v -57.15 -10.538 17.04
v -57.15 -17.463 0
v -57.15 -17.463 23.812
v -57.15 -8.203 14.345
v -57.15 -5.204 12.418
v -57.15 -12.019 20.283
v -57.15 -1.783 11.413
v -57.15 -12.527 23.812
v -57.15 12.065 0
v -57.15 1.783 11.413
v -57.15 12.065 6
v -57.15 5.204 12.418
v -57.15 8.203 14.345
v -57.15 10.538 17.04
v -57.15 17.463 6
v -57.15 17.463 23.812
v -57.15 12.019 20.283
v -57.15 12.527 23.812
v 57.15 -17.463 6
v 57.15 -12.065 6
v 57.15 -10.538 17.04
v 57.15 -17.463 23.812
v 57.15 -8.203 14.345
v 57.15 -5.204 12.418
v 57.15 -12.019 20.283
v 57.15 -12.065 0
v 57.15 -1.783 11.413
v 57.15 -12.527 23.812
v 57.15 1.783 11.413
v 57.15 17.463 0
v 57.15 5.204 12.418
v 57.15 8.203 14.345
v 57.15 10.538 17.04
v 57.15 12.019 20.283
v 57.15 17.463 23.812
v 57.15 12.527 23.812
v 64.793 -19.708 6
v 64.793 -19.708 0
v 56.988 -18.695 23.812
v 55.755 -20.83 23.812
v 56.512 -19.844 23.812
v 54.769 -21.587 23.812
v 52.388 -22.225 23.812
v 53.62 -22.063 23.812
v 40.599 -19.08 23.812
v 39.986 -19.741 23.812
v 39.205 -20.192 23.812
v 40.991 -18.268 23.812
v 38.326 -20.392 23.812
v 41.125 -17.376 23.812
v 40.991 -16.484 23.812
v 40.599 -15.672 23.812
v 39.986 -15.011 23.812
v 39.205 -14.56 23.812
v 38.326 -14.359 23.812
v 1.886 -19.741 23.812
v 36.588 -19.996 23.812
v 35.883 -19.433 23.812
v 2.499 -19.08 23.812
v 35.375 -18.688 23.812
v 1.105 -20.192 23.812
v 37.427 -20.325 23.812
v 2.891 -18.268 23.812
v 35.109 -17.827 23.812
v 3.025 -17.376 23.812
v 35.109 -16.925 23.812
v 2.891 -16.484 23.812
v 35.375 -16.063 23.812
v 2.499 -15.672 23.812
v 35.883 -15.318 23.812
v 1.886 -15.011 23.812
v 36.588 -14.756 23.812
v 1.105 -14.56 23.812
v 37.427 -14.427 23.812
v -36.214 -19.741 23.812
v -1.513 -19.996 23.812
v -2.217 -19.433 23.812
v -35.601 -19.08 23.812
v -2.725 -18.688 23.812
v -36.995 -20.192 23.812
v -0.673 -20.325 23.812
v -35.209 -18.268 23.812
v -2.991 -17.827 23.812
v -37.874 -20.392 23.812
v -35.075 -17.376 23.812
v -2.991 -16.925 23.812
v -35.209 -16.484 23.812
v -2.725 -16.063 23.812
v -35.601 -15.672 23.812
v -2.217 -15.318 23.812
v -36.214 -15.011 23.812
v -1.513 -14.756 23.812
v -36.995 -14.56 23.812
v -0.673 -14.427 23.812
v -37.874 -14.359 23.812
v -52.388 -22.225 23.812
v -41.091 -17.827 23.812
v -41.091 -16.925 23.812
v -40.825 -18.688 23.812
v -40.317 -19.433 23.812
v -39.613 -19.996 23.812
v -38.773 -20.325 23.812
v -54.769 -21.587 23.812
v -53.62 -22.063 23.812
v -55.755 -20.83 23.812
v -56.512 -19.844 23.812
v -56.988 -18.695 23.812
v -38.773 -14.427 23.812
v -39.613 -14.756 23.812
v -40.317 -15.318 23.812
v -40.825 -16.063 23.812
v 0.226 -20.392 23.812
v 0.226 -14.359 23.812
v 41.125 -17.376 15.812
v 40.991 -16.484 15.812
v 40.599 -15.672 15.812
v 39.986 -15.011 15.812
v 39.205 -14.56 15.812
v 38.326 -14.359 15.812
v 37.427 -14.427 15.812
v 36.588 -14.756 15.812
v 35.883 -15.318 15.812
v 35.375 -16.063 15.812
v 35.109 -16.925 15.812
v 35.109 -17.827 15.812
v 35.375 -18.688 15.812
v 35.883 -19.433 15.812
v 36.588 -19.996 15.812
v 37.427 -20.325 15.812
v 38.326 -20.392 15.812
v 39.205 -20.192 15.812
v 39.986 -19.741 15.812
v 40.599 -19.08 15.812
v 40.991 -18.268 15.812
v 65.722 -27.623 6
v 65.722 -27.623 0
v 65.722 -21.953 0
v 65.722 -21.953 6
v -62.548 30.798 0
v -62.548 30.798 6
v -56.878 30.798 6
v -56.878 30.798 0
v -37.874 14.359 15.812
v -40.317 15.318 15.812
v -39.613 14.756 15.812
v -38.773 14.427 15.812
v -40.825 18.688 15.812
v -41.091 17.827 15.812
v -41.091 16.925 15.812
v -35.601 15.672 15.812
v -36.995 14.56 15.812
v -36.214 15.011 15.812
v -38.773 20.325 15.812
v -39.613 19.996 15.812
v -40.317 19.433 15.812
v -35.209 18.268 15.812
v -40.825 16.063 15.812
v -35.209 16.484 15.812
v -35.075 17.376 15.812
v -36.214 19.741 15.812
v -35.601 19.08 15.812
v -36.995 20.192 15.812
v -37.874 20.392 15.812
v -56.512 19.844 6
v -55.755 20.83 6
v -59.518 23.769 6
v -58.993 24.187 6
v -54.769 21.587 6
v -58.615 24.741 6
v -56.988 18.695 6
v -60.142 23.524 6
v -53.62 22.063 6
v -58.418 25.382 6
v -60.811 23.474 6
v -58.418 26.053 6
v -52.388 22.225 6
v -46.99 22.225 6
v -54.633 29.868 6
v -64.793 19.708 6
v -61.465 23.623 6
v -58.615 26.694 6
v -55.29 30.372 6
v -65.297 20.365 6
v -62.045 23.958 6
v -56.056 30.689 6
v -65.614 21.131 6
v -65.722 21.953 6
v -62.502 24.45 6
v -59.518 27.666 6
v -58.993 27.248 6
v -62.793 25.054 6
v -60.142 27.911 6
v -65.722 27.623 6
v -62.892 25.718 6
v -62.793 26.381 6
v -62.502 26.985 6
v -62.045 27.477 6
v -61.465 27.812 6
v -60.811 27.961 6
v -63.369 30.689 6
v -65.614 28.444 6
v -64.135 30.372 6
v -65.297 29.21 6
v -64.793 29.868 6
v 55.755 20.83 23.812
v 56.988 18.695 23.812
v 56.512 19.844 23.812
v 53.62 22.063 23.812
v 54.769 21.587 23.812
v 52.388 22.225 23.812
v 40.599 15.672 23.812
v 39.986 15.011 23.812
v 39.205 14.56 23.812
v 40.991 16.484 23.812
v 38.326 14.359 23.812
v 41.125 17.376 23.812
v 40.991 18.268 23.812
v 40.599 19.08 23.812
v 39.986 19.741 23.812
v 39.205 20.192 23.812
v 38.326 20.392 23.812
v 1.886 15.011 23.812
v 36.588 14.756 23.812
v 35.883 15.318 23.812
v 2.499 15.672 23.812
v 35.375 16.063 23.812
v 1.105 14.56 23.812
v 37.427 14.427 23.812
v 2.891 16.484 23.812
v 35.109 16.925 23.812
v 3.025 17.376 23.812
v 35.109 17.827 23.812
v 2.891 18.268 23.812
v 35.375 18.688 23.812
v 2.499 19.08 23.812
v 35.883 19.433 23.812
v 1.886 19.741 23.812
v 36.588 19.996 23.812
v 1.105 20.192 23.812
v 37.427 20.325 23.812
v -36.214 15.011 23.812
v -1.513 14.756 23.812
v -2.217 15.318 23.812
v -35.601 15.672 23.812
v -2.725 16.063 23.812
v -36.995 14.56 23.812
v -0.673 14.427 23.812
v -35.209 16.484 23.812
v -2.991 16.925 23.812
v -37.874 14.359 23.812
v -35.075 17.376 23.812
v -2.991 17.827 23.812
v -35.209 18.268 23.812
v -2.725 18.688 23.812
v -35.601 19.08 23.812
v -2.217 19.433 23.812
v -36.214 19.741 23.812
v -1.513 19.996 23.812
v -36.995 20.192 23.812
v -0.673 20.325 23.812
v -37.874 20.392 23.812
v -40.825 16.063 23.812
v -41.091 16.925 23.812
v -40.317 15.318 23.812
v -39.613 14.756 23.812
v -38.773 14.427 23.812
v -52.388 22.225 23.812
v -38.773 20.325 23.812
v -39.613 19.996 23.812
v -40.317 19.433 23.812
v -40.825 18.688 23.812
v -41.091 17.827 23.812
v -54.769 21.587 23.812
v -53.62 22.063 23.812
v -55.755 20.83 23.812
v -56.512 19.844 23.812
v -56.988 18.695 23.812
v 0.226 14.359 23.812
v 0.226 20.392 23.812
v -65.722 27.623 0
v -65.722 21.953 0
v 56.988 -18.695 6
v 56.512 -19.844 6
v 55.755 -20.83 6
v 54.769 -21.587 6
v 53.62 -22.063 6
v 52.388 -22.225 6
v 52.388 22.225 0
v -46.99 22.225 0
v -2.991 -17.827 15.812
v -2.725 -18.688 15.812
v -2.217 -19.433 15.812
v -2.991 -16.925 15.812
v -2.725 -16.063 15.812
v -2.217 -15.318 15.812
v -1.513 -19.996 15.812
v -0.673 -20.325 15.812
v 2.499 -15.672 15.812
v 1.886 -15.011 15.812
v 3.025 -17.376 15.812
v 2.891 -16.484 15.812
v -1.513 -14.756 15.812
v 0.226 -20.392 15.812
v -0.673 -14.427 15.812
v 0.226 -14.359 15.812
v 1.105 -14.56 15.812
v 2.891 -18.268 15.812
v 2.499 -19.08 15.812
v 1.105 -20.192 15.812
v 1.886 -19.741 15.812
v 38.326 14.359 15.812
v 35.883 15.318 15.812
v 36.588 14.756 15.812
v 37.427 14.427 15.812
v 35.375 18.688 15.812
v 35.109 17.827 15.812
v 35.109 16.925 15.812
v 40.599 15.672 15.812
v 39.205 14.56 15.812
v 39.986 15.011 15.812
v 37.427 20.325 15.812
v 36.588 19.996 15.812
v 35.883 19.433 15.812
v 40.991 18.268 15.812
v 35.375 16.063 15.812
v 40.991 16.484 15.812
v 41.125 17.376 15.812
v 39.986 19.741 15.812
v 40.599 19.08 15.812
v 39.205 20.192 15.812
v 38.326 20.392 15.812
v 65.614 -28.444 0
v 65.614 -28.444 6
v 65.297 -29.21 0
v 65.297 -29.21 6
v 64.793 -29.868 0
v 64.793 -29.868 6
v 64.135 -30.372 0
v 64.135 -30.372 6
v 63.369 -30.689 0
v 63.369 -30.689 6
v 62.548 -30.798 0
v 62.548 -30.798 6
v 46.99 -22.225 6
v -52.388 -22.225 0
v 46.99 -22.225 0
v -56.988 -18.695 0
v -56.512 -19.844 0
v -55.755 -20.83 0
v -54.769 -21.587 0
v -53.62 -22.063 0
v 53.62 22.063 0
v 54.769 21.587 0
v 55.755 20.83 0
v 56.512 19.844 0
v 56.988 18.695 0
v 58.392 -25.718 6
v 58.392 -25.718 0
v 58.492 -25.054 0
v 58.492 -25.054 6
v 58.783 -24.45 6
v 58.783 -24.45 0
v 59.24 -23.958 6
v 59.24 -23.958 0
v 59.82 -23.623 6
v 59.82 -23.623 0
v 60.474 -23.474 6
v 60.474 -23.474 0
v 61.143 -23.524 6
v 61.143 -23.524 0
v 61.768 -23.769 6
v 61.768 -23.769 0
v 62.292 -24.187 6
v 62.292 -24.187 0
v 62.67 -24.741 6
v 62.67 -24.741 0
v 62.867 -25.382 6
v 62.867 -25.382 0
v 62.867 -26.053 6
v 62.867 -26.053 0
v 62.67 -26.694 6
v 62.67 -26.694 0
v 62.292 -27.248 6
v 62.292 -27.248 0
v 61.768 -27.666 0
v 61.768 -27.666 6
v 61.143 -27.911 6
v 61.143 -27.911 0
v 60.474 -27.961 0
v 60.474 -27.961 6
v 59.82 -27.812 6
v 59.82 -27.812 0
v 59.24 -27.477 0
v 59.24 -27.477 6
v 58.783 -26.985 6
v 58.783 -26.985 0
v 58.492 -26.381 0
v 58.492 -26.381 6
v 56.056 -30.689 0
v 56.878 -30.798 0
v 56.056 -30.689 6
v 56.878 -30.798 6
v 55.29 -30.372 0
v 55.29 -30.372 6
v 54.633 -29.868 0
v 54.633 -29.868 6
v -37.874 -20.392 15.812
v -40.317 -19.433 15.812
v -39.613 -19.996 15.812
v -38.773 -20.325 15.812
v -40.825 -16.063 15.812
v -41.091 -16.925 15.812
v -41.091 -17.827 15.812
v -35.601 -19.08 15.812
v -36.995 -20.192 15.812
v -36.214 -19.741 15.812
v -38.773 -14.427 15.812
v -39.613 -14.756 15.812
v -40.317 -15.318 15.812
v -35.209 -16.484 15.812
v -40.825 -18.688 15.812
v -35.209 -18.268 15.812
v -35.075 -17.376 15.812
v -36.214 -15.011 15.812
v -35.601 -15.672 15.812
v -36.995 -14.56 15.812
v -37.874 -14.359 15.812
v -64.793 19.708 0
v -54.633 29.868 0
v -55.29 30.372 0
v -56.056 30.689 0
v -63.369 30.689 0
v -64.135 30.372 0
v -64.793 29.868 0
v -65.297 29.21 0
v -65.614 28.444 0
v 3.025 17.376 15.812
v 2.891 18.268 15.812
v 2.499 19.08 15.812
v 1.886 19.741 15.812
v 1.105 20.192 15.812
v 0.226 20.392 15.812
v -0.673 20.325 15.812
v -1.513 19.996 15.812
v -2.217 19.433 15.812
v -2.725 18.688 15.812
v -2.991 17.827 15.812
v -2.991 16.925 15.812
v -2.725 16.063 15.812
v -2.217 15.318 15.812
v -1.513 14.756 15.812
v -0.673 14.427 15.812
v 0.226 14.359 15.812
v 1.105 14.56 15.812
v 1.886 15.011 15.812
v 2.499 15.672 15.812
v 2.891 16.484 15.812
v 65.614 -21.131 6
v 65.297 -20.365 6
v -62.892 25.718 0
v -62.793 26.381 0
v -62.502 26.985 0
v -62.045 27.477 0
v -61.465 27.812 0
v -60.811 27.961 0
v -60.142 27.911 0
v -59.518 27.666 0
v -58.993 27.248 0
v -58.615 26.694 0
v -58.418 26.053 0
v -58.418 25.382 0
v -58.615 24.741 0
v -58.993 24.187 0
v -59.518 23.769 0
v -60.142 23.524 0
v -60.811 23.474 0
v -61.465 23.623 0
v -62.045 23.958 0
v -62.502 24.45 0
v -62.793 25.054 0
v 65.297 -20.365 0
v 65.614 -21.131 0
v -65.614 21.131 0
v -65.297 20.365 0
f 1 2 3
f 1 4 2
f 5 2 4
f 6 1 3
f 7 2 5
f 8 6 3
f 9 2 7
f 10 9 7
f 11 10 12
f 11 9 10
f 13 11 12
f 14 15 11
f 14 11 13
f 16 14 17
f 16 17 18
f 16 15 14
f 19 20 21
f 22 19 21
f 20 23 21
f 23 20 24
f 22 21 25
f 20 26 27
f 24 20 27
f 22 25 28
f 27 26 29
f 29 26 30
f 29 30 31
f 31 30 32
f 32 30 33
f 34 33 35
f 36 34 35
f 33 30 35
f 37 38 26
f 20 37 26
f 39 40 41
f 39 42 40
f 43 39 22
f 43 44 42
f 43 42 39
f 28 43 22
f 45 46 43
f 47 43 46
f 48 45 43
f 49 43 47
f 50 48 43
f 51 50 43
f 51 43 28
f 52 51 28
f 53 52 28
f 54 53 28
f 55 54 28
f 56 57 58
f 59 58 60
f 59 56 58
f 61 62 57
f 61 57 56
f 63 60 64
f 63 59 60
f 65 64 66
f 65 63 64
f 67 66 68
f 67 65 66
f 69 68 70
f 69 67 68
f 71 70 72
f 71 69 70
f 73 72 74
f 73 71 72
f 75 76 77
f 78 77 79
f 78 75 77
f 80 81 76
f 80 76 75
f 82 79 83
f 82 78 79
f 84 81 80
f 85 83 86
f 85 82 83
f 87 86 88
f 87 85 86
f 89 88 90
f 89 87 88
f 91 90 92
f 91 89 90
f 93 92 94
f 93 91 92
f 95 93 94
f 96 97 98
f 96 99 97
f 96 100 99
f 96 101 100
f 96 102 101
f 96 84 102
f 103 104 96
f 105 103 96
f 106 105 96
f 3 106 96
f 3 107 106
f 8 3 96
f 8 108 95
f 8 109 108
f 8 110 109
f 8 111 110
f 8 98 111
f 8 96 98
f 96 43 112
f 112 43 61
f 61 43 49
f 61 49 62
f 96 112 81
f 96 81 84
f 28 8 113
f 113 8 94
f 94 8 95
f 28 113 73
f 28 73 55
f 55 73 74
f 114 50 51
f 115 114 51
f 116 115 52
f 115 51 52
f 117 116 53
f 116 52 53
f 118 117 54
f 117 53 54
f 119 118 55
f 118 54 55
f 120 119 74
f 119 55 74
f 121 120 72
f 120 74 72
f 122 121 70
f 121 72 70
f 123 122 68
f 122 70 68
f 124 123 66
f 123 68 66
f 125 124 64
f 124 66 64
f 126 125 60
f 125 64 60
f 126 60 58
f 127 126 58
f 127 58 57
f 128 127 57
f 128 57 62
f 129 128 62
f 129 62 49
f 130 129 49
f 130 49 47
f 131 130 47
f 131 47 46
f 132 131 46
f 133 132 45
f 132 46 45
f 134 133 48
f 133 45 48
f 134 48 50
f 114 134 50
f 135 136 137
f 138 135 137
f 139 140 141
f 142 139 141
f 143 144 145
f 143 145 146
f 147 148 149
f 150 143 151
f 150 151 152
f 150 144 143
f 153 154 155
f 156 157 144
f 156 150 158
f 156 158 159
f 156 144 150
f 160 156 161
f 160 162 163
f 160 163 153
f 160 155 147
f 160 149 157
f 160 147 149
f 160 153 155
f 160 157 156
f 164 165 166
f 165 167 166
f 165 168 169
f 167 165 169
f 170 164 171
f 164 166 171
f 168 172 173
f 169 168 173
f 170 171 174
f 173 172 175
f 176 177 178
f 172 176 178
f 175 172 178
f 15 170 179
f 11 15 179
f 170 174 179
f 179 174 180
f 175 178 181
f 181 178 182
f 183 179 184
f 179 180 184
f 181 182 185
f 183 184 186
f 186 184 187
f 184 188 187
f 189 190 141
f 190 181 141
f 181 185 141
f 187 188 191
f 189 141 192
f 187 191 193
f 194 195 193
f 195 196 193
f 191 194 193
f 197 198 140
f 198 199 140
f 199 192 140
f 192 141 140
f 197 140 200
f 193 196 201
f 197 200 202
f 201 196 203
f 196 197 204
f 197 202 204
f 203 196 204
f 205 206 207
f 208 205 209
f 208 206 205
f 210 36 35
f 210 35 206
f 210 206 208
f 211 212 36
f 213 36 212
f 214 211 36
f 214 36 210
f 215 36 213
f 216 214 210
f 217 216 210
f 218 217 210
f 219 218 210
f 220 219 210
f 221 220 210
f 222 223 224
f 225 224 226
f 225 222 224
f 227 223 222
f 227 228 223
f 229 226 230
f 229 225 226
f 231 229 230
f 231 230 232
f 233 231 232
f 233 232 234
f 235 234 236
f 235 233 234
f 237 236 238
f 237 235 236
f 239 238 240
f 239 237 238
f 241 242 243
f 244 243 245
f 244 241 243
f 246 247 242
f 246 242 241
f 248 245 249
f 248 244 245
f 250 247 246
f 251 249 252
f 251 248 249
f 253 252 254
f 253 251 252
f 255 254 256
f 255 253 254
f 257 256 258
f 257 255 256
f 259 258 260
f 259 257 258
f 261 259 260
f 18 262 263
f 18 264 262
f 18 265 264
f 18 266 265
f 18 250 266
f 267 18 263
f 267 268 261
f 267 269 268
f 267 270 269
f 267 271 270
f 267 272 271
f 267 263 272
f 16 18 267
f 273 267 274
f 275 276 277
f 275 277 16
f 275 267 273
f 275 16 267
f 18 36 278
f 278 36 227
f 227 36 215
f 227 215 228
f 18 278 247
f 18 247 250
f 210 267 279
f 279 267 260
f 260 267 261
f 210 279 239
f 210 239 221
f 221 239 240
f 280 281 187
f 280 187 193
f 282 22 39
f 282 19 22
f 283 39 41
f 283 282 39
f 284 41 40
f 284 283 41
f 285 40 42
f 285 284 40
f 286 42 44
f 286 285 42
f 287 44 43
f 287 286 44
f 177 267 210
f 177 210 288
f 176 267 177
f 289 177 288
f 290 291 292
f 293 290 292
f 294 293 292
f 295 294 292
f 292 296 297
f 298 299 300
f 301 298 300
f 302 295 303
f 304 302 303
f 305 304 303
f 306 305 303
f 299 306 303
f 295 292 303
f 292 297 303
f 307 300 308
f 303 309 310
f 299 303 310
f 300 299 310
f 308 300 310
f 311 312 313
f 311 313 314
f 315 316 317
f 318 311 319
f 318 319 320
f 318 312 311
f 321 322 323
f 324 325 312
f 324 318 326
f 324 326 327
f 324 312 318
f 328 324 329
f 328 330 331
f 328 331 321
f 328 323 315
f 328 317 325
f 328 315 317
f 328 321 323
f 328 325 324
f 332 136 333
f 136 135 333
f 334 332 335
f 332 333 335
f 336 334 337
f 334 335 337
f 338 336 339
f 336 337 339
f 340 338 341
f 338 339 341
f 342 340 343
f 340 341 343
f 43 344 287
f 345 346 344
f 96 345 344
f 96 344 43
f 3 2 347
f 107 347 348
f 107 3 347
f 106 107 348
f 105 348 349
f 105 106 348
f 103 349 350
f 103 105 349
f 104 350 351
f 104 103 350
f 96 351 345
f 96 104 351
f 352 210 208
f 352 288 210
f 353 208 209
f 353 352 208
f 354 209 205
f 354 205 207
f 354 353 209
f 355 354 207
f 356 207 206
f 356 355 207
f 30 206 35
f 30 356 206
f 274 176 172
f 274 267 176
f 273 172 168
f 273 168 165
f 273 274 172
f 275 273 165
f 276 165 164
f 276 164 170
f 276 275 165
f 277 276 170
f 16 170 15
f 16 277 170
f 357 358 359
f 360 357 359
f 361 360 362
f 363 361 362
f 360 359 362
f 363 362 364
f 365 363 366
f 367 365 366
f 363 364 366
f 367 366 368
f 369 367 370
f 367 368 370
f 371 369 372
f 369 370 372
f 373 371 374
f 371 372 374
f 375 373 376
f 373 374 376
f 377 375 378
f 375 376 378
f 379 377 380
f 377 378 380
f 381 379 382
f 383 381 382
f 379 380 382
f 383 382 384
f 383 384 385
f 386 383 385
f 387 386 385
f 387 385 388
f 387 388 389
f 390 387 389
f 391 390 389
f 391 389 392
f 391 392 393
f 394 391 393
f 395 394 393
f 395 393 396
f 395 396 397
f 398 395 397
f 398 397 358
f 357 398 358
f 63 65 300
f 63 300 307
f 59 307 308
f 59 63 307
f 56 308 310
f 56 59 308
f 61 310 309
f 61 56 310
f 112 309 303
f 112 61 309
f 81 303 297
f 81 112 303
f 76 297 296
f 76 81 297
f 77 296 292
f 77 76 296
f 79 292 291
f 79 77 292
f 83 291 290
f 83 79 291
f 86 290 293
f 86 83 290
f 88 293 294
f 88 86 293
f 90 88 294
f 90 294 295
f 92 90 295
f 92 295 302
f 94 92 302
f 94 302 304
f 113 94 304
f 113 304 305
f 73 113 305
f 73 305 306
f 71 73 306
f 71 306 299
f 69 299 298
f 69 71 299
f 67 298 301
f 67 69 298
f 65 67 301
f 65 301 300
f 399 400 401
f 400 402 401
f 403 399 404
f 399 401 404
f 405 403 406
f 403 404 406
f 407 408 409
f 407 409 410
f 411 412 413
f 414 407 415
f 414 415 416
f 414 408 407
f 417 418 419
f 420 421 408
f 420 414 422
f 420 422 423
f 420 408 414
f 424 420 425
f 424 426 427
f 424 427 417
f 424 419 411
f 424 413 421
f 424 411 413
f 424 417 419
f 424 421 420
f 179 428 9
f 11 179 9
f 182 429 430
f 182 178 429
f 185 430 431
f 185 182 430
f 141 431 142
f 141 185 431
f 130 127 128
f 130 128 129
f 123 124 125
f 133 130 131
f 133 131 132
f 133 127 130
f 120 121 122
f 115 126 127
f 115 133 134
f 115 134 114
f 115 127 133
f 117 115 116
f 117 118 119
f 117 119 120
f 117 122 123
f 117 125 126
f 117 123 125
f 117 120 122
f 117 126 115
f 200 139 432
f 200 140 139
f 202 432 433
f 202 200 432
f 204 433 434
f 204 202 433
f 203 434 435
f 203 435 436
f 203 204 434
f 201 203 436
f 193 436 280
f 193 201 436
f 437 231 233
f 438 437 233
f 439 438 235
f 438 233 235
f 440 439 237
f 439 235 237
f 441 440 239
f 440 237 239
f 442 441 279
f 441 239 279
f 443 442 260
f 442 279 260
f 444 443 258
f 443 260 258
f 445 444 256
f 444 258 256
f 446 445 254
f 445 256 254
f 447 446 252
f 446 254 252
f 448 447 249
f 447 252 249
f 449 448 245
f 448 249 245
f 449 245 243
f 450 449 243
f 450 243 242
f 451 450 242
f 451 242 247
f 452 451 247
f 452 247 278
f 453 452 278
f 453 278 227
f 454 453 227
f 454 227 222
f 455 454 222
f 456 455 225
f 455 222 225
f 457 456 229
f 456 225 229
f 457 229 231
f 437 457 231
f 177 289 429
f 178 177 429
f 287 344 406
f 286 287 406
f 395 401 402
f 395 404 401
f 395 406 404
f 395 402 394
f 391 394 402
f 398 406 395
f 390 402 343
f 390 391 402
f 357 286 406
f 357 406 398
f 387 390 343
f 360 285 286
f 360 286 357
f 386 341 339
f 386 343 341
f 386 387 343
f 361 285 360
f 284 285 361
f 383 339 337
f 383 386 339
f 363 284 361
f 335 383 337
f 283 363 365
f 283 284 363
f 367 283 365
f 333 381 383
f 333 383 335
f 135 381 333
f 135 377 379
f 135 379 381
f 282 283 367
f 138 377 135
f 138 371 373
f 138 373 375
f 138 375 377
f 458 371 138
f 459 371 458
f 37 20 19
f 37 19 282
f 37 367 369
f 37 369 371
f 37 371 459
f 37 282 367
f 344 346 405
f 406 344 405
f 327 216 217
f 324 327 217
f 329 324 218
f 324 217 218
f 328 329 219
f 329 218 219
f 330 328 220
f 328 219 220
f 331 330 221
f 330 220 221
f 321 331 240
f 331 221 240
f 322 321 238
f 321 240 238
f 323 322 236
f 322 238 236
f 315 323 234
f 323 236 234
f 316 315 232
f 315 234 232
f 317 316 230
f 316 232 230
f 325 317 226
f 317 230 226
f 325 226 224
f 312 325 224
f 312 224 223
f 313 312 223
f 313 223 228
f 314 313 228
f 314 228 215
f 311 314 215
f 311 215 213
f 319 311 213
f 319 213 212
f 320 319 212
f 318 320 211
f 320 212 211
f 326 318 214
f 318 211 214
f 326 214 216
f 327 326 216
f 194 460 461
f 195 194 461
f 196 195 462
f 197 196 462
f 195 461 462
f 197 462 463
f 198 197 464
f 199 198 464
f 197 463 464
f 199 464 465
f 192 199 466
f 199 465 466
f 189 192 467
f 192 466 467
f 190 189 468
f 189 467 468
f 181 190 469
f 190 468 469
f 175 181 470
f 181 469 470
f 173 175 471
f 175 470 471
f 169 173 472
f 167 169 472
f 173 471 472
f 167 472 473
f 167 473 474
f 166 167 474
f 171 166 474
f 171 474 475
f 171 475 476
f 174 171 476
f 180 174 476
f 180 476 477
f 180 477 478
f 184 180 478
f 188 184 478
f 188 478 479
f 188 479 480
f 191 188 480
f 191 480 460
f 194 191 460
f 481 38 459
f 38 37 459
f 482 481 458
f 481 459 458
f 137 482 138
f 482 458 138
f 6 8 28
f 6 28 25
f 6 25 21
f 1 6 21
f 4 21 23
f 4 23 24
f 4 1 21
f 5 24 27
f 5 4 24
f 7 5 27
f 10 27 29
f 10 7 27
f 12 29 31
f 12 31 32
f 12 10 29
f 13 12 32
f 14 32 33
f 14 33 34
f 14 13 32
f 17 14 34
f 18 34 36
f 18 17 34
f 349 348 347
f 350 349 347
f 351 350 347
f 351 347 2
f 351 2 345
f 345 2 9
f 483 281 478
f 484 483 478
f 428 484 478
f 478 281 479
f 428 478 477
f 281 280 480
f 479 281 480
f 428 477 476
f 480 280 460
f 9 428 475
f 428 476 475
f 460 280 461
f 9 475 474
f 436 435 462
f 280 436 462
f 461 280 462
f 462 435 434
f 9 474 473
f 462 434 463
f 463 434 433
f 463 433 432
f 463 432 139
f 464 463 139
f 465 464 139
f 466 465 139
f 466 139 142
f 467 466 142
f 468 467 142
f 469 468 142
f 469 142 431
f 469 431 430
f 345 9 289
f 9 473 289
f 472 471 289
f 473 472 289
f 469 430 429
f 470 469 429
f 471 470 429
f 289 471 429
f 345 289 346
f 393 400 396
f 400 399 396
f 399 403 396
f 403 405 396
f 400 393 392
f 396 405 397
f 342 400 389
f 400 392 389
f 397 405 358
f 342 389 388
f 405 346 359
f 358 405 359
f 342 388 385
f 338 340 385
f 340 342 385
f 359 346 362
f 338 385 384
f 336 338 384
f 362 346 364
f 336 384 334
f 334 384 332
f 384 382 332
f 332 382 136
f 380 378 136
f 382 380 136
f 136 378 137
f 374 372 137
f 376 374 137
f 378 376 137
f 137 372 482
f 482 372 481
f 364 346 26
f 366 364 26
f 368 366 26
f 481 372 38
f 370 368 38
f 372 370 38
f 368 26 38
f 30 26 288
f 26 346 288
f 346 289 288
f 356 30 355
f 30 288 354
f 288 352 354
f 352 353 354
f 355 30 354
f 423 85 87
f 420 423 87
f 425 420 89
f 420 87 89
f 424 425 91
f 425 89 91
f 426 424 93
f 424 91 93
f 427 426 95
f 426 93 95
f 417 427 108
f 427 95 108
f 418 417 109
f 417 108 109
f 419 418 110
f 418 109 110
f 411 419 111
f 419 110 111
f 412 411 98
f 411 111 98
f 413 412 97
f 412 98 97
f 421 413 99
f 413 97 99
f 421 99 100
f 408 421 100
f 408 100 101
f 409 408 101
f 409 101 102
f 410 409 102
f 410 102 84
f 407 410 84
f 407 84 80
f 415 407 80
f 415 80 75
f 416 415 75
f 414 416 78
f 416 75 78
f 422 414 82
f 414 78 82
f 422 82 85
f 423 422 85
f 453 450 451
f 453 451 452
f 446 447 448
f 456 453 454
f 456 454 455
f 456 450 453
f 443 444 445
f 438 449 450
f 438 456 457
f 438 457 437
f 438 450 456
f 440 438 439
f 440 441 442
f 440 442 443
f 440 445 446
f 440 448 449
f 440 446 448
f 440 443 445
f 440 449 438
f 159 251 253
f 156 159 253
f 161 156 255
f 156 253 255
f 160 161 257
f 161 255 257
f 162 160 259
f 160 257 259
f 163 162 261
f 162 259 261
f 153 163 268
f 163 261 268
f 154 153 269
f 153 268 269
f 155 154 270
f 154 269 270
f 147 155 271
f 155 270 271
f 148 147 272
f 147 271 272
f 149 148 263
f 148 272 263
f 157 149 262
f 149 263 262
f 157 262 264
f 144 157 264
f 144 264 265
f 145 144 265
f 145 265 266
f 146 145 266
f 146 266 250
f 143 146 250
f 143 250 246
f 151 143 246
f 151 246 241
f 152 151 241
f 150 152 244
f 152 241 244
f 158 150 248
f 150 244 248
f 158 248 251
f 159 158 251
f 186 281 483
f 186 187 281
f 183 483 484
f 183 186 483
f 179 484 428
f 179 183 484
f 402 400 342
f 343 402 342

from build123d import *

# Parameters (mm, degrees)
SKETCH1_W               = 114.3
SKETCH1_H               = 44.45
BOSS_EXTRUDE1_DEPTH     = 5
BOSS_EXTRUDE2_DEPTH     = 114.3
SKETCH3_R               = 3.025
CUT_EXTRUDE1_DEPTH      = 8
LPATTERN1_COUNT         = 2
LPATTERN1_PITCH         = 38.1
LPATTERN1_COL_COUNT     = 2
LPATTERN1_COL_PITCH     = 38.1
MIRROR1_COPY_1_SKETCH_R = 3.025
MIRROR1_COPY_1_DEPTH    = 8
MIRROR1_COPY_2_SKETCH_R = 3.025
MIRROR1_COPY_2_DEPTH    = 8
SKETCH4_W               = 10.16
SKETCH4_H               = 10.16
BOSS_EXTRUDE3_DEPTH     = 6
M4_CLEARANCE_HOLE1_D    = 4.5
FILLET3_R               = 3.175
FILLET4_R               = 4.7625


with BuildPart() as part:
    # Sketch1 → Boss-Extrude1 (new body)
    with BuildSketch(Plane.XY):
        Rectangle(SKETCH1_W, SKETCH1_H)
    extrude(amount=BOSS_EXTRUDE1_DEPTH)

    # Sketch2 → Boss-Extrude2 (add)
    with BuildSketch(Plane.ZY.offset(57.15)):
        with BuildLine():
            Line((23.8125, 22.225), (5, 22.225))
            Line((5, 22.225), (5, -22.225))
            Line((5, -22.225), (23.8125, -22.225))
            Line((23.8125, -22.225), (23.8125, -12.5269))
            ThreePointArc((23.8125, -12.5269), (11.2856, 0), (23.8125, 12.5269))
            Line((23.8125, 12.5269), (23.8125, 22.225))
        make_face()
    extrude(amount=-BOSS_EXTRUDE2_DEPTH)

    # Sketch3 → Cut-Extrude1 (cut)
    with BuildSketch(Plane.XY.offset(23.8125)):
        with Locations((0, 17.37595)):
            Circle(SKETCH3_R)
    cut_extrude1 = extrude(amount=-CUT_EXTRUDE1_DEPTH, mode=Mode.SUBTRACT)

    # LPattern1: Cut-Extrude1 ×2
    with Locations(*[(i * LPATTERN1_PITCH, 0, 0) for i in range(1, LPATTERN1_COUNT)]):
        add(cut_extrude1, mode=Mode.SUBTRACT)

    # LPattern1 col: Cut-Extrude1 ×2
    with Locations(*[(-i * LPATTERN1_COL_PITCH, 0, 0) for i in range(1, LPATTERN1_COL_COUNT)]):
        add(cut_extrude1, mode=Mode.SUBTRACT)

    # Mirror1: Cut-Extrude1 across plane
    add(cut_extrude1.mirror(Plane.ZX), mode=Mode.SUBTRACT)

    # Mirror1 copy 1 sketch → Mirror1 copy 1 (cut)
    with BuildSketch(Plane(origin=(38.1, 0, 23.8125), x_dir=(1, 0, 0), z_dir=(0, 0, 1))):
        with Locations((0, -17.37595)):
            Circle(MIRROR1_COPY_1_SKETCH_R)
    extrude(amount=-MIRROR1_COPY_1_DEPTH, mode=Mode.SUBTRACT)

    # Mirror1 copy 2 sketch → Mirror1 copy 2 (cut)
    with BuildSketch(Plane(origin=(-38.1, 0, 23.8125), x_dir=(1, 0, 0), z_dir=(0, 0, 1))):
        with Locations((0, -17.37595)):
            Circle(MIRROR1_COPY_2_SKETCH_R)
    extrude(amount=-MIRROR1_COPY_2_DEPTH, mode=Mode.SUBTRACT)

    # Sketch4 → Boss-Extrude3 (add)
    with BuildSketch(Plane.XY):
        Polygon((-65.7225, 30.7975), (-55.5625, 20.6375), (-65.7225, 20.6375), align=None)
        Polygon((-65.7225, 30.7975), (-55.5625, 30.7975), (-55.5625, 20.6375), align=None)
        with Locations((60.6425, -25.7175)):
            Rectangle(SKETCH4_W, SKETCH4_H)
        Polygon((-55.5625, 30.7975), (-60.6425, 25.7175), (-57.15, 22.225), (-55.5625, 22.225), align=None)
        Polygon((-46.99, 22.225), (-55.5625, 30.7975), (-55.5625, 22.225), align=None)
        Polygon((-60.6425, 25.7175), (-65.7225, 20.6375), (-57.15, 20.6375), (-57.15, 22.225), align=None)
        Polygon((-57.15, 20.6375), (-65.7225, 20.6375), (-57.15, 12.065), align=None)
        Polygon((57.15, -20.6375), (65.7225, -20.6375), (57.15, -12.065), align=None)
        Polygon((46.99, -22.225), (55.5625, -30.7975), (55.5625, -22.225), align=None)
    extrude(amount=BOSS_EXTRUDE3_DEPTH)

    # M4 Clearance Hole1 (through all)
    with Locations(Plane.XY.offset(6)):
        with Locations((-60.6425, 25.7175), (60.6425, -25.7175)):
            Hole(M4_CLEARANCE_HOLE1_D / 2)

    # Fillet3
    fillet3_edges = [part.edges().sort_by_distance(p)[0] for p in [
        (-55.5625, 30.7975, 3),
        (-65.7225, 30.7975, 3),
        (-65.7225, 20.6375, 3),
        (55.5625, -30.7975, 3),
        (65.7225, -30.7975, 3),
        (65.7225, -20.6375, 3),
    ]]
    fillet(fillet3_edges, radius=FILLET3_R)

    # Fillet4
    fillet4_edges = [part.edges().sort_by_distance(p)[0] for p in [
        (57.15, -22.225, 14.90625),
        (-57.15, -22.225, 11.90625),
        (-57.15, 22.225, 14.90625),
        (57.15, 22.225, 11.90625),
    ]]
    fillet(fillet4_edges, radius=FILLET4_R)


solid = part.part
